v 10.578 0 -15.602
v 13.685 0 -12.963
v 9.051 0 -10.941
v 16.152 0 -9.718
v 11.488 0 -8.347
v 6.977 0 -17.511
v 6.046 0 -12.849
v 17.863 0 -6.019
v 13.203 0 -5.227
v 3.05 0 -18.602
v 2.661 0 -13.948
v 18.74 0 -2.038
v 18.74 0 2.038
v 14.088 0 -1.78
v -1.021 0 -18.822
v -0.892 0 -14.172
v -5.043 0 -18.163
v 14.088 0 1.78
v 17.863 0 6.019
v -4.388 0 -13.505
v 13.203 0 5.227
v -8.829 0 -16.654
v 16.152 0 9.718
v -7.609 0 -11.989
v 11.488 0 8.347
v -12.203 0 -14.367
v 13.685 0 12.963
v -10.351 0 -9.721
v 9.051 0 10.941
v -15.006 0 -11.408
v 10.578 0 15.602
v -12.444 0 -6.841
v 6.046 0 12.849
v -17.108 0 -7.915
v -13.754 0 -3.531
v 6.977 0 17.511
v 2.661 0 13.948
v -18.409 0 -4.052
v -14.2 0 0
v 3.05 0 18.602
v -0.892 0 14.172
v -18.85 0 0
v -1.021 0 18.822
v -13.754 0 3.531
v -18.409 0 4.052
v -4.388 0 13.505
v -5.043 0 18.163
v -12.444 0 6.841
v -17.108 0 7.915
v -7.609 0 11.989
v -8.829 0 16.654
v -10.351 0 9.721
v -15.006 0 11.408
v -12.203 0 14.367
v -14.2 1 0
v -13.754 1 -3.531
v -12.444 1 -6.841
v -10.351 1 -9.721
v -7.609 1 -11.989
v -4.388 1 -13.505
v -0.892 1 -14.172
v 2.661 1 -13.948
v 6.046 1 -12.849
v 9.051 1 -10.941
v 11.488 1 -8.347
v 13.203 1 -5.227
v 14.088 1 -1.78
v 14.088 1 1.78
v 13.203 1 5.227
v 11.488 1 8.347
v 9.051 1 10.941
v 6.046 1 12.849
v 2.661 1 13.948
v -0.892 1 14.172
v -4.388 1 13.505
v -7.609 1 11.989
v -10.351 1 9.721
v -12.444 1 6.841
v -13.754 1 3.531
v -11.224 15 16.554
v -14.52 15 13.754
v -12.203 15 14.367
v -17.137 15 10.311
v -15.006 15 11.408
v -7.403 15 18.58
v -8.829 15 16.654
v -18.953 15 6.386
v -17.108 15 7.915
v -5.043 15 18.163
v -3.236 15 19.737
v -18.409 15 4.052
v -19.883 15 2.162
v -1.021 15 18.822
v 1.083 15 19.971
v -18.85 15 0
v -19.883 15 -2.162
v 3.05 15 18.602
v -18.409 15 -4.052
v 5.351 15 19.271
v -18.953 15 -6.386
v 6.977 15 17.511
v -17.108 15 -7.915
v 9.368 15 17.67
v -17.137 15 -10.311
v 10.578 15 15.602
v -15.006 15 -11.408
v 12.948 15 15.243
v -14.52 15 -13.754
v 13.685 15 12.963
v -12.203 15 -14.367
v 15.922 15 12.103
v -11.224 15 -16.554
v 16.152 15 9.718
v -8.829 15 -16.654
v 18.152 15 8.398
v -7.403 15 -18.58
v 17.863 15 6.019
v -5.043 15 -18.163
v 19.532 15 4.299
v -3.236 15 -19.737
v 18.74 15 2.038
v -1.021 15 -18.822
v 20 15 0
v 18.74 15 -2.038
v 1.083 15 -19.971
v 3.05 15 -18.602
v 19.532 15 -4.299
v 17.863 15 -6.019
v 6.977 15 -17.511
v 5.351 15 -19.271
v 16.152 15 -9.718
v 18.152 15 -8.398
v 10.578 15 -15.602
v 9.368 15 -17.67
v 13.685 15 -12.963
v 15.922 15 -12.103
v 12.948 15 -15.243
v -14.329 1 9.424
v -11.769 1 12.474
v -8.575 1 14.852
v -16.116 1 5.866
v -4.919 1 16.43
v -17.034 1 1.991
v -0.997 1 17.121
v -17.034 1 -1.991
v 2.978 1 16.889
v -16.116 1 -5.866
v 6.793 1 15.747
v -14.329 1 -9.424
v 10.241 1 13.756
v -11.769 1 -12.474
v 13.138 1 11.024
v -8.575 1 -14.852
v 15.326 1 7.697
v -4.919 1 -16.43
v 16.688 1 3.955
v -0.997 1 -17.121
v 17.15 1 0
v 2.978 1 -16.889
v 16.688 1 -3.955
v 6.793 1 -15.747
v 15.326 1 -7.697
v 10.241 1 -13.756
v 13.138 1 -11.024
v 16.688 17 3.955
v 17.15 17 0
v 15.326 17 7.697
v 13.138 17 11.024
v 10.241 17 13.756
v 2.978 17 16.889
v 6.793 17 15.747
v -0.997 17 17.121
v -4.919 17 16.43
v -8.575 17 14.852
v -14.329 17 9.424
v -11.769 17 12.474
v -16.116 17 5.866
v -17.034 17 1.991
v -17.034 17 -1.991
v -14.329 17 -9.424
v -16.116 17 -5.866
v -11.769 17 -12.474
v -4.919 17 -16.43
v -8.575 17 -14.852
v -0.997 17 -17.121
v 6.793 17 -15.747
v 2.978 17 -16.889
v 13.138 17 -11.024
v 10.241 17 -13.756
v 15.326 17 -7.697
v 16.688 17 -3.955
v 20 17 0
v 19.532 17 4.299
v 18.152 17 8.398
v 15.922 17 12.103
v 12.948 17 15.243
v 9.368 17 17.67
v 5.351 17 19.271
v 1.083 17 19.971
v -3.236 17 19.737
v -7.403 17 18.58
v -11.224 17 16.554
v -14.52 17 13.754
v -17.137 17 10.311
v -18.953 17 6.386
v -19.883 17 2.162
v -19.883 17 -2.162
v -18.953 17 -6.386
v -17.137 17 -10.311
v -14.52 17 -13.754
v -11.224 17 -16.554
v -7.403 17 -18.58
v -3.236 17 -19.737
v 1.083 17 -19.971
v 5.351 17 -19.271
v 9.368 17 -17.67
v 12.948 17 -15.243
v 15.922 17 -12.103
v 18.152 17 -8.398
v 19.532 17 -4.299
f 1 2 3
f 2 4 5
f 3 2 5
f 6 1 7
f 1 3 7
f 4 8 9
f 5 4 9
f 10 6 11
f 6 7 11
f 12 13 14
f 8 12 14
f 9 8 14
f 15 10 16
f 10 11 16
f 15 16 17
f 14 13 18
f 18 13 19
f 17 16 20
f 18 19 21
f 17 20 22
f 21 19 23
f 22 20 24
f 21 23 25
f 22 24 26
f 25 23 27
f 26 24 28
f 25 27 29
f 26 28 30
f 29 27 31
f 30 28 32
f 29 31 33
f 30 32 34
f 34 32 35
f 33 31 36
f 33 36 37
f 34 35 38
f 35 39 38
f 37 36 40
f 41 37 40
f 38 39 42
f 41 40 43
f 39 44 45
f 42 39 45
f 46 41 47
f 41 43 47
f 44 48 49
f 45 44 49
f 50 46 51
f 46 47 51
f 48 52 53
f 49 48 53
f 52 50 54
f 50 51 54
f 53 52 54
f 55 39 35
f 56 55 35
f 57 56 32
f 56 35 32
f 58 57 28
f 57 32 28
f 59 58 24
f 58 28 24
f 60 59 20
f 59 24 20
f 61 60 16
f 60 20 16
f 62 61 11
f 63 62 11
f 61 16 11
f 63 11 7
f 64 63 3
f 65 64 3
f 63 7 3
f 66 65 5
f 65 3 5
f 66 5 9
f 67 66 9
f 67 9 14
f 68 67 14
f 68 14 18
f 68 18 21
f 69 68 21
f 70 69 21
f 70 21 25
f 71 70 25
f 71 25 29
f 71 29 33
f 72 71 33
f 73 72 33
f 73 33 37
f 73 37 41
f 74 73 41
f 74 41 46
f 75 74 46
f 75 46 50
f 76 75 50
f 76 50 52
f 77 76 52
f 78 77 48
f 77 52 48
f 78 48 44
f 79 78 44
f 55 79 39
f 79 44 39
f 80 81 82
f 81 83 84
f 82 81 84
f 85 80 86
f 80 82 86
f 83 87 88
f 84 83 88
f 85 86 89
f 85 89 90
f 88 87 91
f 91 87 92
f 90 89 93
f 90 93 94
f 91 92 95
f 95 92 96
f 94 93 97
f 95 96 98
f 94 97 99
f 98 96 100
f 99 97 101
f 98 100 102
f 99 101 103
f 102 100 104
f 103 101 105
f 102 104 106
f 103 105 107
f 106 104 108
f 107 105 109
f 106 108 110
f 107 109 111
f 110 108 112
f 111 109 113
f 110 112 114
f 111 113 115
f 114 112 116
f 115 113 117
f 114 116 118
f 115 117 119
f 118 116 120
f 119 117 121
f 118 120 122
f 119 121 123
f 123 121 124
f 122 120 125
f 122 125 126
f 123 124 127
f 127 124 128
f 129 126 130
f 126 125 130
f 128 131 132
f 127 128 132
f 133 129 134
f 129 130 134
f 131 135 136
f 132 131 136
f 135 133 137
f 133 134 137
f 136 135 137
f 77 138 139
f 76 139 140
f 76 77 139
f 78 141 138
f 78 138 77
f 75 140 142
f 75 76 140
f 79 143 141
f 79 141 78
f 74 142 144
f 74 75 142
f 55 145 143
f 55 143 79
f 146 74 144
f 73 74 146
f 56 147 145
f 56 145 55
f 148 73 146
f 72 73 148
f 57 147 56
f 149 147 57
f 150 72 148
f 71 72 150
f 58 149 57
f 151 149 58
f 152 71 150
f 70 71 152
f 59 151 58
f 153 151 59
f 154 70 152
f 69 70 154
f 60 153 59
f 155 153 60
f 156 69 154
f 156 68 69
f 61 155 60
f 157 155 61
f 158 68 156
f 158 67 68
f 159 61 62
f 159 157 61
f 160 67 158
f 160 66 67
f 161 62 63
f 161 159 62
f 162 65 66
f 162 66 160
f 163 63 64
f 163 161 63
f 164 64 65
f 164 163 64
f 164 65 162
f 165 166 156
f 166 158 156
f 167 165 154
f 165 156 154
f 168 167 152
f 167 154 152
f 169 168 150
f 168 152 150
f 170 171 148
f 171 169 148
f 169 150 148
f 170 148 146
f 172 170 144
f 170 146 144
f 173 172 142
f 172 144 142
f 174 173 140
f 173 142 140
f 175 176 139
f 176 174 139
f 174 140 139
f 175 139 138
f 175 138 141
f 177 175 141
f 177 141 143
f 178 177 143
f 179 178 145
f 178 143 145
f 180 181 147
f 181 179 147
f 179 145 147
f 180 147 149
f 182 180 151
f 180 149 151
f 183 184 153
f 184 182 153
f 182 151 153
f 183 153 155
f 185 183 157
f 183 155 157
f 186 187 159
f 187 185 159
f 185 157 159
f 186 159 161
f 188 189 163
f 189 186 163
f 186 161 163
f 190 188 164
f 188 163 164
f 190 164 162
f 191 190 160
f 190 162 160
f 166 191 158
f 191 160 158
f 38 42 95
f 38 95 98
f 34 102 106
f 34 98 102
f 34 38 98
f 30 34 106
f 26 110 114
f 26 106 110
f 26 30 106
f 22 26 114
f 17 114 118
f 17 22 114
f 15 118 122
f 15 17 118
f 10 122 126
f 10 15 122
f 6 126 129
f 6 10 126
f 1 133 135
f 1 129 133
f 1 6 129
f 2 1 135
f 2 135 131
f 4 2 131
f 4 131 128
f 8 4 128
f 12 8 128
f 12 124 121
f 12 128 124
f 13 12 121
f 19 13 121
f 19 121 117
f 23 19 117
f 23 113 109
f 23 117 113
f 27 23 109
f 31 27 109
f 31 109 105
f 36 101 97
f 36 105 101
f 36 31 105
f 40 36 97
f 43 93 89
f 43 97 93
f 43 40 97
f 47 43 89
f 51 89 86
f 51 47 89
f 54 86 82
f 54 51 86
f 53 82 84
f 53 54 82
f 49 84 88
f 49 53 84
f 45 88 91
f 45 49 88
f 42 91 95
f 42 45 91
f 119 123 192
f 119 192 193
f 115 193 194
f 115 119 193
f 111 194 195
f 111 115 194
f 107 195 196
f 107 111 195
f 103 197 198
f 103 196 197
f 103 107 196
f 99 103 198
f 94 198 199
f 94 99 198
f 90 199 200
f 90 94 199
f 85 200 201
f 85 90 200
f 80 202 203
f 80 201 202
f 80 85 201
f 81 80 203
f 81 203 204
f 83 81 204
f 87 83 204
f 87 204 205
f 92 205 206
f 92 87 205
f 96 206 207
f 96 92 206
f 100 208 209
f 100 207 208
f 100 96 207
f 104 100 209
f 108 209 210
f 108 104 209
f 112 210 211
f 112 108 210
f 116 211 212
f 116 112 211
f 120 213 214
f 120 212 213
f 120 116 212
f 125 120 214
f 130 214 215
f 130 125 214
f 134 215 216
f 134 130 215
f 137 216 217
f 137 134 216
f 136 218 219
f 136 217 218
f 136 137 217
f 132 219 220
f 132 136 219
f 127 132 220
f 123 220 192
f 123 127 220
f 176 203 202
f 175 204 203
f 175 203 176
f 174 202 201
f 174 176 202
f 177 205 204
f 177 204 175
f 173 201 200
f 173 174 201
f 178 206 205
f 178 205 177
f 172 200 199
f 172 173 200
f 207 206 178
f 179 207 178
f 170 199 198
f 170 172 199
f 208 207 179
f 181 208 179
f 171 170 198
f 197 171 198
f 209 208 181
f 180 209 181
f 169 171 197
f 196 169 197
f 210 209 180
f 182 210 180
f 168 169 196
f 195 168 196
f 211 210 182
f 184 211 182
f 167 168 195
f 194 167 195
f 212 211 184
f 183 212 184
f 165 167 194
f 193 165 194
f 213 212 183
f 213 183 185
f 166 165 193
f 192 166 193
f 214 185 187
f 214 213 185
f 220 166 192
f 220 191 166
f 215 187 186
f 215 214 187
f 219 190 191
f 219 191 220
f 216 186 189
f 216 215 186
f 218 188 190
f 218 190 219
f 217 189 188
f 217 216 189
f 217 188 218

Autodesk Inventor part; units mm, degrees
ref_plane "YZ Plane" through (0, 0, 0) normal (1, 0, 0) x (0, 1, 0)
ref_plane "XZ Plane" through (0, 0, 0) normal (0, 1, 0) x (-1, 0, 0)
ref_plane "XY Plane" through (0, 0, 0) normal (0, 0, 1) x (1, 0, 0)
sketch "スケッチ1" plane through (0, 0, 0) normal (0, 1, 0) x (-1, 0, 0)
  circle A0 centre (0, 0) radius 18.85
  circle A1 centre (0, 0) radius 14.2
  dimension "d0" = 37.7
  dimension "d1" = 28.4
extrude "押し出し1" add sketch "スケッチ1" along normal blind 15
sketch "スケッチ2" plane through (0, 15, 0) normal (0, 1, 0) x (1, 0, 0)
  circle A0 centre (0, 0) radius 17.15
  dimension "d4" = 34.3
extrude "押し出し2" cut sketch "スケッチ2" against normal blind 14
sketch "スケッチ3" plane through (0, 15, 0) normal (0, 1, 0) x (1, 0, 0)
  circle A0 centre (0, 0) radius 17.15
  circle A1 centre (0, 0) radius 20
  dimension "d7" = 34.3
  dimension "d8" = 40
extrude "押し出し3" add sketch "スケッチ3" along normal blind 2
properties part number "B_pipe_flange_spacer_5" material "ステンレス鋼"
